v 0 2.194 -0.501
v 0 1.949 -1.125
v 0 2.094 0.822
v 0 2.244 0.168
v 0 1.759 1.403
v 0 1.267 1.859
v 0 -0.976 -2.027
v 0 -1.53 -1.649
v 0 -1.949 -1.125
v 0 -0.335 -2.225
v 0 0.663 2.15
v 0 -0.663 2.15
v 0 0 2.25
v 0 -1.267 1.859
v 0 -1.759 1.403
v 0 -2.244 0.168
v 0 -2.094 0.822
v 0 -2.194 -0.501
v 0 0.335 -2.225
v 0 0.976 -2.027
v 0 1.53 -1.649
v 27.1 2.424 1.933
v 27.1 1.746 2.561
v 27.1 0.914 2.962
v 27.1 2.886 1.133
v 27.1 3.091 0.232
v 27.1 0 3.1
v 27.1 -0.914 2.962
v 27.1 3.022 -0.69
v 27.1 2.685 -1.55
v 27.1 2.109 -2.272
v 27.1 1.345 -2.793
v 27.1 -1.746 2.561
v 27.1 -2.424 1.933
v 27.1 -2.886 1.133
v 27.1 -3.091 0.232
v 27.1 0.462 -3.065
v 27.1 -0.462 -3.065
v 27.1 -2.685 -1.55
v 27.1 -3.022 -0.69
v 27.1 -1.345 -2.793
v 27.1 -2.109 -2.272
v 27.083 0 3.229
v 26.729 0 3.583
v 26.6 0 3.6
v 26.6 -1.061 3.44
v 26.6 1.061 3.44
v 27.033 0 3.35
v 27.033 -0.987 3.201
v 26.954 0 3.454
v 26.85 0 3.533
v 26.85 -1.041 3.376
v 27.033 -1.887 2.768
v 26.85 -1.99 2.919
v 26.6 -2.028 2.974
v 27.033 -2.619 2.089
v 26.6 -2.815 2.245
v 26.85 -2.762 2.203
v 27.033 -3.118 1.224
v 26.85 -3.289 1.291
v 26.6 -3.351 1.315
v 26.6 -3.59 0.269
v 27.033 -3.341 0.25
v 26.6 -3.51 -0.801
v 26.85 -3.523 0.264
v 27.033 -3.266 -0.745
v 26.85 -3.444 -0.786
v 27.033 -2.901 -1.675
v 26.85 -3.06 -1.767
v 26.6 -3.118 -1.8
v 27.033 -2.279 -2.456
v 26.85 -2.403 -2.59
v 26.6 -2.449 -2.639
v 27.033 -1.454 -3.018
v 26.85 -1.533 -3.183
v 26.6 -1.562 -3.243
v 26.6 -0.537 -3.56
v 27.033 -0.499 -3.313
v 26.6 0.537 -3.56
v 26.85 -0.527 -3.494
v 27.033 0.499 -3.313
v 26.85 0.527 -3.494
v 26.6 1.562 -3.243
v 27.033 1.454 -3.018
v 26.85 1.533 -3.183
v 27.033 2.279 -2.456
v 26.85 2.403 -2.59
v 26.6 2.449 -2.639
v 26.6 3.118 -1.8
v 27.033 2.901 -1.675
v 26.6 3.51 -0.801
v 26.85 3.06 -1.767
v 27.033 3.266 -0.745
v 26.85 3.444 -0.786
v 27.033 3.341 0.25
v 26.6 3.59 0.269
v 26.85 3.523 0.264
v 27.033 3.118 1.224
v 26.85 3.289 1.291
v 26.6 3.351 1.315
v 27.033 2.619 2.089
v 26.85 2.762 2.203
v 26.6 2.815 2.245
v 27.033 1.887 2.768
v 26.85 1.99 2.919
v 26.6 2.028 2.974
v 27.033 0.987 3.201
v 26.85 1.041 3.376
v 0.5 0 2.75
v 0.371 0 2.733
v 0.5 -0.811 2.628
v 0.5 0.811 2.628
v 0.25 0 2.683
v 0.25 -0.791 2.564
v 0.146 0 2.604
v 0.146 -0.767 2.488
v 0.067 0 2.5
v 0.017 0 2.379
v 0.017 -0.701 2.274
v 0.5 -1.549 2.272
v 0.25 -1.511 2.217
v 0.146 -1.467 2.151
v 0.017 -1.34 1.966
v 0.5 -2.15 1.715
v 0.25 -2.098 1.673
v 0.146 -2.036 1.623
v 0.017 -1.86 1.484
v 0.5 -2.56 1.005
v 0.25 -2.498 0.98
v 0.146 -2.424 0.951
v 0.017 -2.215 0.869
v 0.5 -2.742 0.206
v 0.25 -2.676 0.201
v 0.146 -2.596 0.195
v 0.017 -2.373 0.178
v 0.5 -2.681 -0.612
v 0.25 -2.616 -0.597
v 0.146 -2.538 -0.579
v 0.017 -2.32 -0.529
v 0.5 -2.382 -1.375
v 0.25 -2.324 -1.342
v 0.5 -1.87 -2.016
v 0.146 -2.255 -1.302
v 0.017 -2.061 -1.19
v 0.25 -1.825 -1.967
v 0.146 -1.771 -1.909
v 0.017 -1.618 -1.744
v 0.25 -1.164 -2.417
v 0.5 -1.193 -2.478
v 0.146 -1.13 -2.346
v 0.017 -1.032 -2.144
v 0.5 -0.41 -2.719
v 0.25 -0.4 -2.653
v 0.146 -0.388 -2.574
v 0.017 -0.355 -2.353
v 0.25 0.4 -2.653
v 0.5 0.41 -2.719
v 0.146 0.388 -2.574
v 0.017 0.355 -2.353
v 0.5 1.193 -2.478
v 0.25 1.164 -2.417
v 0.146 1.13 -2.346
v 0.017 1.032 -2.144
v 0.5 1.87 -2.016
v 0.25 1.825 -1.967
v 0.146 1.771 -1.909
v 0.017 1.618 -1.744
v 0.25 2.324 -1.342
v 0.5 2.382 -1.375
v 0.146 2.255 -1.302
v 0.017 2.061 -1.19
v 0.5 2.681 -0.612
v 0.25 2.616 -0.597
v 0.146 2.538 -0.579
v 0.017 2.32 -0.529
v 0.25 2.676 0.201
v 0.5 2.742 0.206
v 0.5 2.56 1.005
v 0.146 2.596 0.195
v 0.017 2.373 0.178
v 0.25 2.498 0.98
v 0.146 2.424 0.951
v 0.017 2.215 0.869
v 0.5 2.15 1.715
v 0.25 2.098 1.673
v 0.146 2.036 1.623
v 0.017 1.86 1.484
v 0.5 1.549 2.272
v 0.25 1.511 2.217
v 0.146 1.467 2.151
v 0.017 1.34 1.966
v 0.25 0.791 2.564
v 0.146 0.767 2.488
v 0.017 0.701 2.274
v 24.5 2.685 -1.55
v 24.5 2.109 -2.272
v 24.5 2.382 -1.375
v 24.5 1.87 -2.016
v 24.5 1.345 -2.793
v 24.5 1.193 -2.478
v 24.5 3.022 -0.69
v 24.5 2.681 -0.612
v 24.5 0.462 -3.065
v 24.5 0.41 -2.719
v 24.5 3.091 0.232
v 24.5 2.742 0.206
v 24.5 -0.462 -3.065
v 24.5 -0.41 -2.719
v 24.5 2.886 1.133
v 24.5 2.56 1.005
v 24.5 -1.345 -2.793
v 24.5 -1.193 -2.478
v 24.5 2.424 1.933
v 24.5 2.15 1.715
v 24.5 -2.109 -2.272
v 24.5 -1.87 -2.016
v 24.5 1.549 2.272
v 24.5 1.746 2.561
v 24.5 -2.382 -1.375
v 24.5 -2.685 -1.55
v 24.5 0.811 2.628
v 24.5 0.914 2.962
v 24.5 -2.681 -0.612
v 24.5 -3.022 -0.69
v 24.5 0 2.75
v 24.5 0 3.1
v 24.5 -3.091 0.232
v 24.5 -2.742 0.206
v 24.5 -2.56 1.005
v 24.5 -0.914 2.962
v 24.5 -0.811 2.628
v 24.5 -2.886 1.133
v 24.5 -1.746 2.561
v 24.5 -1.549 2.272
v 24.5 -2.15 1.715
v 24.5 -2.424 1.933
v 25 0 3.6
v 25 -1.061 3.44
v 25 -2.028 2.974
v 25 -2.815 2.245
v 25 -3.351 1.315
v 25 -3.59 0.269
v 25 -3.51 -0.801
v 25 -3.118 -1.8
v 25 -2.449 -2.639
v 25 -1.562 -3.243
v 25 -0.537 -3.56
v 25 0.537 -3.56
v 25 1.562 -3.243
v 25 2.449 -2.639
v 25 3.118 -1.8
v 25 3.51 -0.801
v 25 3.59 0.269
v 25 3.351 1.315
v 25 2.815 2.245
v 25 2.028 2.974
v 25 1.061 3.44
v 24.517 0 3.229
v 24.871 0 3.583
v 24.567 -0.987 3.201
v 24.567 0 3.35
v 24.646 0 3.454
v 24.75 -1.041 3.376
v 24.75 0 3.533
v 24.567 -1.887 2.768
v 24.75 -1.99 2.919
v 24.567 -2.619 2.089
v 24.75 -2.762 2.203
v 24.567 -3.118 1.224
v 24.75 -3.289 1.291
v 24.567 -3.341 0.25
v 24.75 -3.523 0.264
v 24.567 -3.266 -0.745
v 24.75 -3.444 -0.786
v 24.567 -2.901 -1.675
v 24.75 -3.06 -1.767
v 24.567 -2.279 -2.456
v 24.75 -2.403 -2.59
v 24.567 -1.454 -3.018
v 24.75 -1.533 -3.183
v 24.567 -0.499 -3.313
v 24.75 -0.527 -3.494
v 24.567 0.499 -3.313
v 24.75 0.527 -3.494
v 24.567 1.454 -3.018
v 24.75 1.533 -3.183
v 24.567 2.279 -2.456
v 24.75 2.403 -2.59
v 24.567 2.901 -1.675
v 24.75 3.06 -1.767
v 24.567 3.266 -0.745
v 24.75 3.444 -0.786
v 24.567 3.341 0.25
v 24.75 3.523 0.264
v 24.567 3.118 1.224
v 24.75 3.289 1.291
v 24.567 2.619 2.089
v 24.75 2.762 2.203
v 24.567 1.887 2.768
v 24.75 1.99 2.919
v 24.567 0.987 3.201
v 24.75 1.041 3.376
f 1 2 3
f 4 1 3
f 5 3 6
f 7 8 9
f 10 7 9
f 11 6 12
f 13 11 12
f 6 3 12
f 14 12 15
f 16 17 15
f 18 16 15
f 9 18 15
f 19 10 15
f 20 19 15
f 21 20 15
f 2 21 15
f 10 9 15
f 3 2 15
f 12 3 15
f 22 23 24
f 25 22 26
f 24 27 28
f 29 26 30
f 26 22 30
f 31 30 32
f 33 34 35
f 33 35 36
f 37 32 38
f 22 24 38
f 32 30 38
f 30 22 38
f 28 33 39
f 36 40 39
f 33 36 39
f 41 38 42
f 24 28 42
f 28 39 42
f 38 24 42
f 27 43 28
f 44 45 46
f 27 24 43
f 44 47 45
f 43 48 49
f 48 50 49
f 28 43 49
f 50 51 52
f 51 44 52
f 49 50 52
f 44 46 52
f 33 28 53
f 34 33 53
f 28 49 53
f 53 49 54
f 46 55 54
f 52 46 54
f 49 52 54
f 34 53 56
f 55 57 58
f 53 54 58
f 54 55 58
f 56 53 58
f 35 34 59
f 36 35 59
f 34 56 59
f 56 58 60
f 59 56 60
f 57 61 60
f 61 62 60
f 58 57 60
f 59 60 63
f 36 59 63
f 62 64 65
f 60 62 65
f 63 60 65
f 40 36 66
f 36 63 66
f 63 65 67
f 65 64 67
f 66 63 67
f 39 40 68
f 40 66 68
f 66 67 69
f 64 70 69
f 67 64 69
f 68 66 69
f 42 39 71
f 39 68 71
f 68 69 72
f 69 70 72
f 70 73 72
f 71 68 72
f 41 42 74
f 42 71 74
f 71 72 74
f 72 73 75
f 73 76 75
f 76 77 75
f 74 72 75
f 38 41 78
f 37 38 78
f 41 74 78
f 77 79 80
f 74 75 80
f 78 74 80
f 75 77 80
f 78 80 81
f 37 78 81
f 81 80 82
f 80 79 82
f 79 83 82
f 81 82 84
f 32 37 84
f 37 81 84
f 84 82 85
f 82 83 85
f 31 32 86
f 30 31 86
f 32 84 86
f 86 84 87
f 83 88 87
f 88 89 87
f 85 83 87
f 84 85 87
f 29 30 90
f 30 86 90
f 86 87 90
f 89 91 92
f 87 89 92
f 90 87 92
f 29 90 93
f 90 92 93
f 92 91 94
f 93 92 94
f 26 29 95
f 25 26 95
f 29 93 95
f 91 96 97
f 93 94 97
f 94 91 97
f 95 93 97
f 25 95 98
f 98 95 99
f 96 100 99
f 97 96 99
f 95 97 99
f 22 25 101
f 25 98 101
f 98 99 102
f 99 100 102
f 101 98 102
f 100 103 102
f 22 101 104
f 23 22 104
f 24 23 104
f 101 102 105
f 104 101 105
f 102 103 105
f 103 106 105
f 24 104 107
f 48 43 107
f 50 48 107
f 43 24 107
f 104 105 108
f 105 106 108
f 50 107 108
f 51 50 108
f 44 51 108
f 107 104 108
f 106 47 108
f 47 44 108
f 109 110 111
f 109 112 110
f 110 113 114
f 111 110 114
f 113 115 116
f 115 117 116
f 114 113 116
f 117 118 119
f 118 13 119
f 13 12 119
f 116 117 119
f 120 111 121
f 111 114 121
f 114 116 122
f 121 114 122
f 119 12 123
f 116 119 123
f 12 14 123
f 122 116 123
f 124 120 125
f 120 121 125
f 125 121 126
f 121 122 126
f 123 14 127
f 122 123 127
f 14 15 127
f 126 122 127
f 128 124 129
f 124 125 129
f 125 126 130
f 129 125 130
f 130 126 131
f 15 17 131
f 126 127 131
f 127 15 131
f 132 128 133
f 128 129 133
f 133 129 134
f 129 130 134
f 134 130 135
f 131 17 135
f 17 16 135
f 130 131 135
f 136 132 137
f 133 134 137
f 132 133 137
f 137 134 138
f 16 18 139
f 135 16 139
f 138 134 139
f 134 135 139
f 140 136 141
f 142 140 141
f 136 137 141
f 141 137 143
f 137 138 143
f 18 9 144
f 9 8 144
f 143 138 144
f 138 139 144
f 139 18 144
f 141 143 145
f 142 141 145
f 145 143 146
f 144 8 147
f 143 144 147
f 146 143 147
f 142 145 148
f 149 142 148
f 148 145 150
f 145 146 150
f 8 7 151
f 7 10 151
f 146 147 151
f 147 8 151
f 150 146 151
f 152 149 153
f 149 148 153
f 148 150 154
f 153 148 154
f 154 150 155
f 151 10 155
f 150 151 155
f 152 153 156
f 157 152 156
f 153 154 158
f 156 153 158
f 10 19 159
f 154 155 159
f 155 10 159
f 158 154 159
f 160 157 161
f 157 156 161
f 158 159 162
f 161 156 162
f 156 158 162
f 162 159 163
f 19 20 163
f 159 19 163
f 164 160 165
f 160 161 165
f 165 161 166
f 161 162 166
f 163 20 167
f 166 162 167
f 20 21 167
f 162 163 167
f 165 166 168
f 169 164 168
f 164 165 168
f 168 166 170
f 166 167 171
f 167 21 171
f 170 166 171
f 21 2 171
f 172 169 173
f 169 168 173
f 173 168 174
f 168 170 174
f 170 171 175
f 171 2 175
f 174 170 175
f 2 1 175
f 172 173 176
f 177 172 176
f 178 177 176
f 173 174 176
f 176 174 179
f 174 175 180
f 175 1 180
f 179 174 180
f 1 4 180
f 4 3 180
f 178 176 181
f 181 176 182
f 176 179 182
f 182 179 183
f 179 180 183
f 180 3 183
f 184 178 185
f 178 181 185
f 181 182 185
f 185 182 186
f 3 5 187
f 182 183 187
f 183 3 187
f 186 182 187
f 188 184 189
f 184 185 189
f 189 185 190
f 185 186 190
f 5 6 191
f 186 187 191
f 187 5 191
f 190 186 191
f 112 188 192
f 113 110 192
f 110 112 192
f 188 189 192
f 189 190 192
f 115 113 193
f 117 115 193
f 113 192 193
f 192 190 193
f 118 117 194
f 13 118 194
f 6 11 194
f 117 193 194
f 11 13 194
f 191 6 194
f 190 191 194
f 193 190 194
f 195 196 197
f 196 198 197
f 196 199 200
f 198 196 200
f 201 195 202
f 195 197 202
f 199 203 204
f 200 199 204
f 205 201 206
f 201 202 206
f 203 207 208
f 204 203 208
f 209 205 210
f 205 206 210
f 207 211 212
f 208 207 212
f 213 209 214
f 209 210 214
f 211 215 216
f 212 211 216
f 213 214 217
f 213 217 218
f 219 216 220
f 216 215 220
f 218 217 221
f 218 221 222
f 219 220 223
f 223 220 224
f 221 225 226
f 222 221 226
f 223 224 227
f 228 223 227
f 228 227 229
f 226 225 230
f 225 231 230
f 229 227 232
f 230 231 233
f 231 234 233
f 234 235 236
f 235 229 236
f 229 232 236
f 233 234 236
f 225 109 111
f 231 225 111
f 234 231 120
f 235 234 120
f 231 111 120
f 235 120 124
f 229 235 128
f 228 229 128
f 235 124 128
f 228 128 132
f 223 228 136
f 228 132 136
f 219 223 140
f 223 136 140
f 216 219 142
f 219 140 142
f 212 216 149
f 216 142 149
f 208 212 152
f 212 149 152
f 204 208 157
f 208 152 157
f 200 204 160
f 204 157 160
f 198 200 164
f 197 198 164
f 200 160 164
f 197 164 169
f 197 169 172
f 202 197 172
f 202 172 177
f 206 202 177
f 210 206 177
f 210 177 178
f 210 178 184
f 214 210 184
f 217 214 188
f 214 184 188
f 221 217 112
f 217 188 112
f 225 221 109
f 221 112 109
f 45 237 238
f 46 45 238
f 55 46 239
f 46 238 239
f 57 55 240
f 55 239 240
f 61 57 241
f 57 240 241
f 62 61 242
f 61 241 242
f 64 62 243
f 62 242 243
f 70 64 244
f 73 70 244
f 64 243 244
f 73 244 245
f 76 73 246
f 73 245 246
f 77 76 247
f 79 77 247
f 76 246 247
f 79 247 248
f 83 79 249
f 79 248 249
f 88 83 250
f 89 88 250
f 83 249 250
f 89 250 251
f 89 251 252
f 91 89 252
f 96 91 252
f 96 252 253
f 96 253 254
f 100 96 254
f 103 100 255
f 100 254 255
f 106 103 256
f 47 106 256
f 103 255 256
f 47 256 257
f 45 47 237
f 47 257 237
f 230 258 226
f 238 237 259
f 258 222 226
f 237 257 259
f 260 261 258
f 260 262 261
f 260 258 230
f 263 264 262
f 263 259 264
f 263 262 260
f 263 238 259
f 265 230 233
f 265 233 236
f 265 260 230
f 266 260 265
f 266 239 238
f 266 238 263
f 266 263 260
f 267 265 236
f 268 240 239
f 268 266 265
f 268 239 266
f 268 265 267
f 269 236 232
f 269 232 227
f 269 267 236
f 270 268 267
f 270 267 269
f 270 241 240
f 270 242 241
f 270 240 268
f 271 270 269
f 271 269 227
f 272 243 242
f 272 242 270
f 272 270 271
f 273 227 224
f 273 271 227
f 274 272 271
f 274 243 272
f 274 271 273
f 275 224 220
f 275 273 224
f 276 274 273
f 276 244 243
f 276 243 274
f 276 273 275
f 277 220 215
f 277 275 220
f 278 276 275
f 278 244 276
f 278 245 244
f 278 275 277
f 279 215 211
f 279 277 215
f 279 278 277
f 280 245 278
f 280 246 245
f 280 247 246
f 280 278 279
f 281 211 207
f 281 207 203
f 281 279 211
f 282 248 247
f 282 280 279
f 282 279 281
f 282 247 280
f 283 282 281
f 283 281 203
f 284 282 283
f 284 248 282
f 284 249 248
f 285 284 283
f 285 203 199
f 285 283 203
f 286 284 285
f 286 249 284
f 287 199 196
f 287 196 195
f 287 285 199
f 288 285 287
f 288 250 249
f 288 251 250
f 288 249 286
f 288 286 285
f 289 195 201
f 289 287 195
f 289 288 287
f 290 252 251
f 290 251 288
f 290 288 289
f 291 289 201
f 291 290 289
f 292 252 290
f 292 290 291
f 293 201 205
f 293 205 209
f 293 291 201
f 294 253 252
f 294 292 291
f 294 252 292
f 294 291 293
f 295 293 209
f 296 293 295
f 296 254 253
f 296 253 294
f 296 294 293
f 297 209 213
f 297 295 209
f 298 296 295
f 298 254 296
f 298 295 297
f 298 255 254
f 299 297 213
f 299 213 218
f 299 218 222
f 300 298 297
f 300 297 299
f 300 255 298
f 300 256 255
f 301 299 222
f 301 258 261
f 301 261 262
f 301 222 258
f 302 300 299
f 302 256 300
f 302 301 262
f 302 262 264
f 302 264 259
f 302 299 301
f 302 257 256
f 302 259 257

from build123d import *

# Parameters (mm, degrees)
FILLET1_R = 0.5
FILLET2_R = 0.5
FILLET3_R = 0.5


with BuildPart() as part:
    # Sketch1 → Revolve1 (revolve)
    with BuildSketch(Plane(origin=(0, 0, 0), x_dir=(1, 0, 0), z_dir=(0, 1, 0)), mode=Mode.PRIVATE) as revolve1_sk:
        Polygon((0, 0), (27.1, 0), (27.1, 3.6), (24.5, 3.6), (24.5, 2.75), (0, 2.75), align=None)
    revolve(revolve1_sk.sketch.rotate(Axis((0, 0, 0), (1, 0, 0)), 180), axis=Axis((0, 0, 0), (1, 0, 0)))

    # Fillet1
    fillet1_edges = [part.edges().sort_by_distance(p)[0] for p in [
        (27.1, 0, -3.6),
    ]]
    fillet(fillet1_edges, radius=FILLET1_R)

    # Fillet2
    fillet2_edges = [part.edges().sort_by_distance(p)[0] for p in [
        (0, 0, -2.75),
    ]]
    fillet(fillet2_edges, radius=FILLET2_R)

    # Fillet3
    fillet3_edges = [part.edges().sort_by_distance(p)[0] for p in [
        (24.5, 0, -3.6),
    ]]
    fillet(fillet3_edges, radius=FILLET3_R)


solid = part.part
